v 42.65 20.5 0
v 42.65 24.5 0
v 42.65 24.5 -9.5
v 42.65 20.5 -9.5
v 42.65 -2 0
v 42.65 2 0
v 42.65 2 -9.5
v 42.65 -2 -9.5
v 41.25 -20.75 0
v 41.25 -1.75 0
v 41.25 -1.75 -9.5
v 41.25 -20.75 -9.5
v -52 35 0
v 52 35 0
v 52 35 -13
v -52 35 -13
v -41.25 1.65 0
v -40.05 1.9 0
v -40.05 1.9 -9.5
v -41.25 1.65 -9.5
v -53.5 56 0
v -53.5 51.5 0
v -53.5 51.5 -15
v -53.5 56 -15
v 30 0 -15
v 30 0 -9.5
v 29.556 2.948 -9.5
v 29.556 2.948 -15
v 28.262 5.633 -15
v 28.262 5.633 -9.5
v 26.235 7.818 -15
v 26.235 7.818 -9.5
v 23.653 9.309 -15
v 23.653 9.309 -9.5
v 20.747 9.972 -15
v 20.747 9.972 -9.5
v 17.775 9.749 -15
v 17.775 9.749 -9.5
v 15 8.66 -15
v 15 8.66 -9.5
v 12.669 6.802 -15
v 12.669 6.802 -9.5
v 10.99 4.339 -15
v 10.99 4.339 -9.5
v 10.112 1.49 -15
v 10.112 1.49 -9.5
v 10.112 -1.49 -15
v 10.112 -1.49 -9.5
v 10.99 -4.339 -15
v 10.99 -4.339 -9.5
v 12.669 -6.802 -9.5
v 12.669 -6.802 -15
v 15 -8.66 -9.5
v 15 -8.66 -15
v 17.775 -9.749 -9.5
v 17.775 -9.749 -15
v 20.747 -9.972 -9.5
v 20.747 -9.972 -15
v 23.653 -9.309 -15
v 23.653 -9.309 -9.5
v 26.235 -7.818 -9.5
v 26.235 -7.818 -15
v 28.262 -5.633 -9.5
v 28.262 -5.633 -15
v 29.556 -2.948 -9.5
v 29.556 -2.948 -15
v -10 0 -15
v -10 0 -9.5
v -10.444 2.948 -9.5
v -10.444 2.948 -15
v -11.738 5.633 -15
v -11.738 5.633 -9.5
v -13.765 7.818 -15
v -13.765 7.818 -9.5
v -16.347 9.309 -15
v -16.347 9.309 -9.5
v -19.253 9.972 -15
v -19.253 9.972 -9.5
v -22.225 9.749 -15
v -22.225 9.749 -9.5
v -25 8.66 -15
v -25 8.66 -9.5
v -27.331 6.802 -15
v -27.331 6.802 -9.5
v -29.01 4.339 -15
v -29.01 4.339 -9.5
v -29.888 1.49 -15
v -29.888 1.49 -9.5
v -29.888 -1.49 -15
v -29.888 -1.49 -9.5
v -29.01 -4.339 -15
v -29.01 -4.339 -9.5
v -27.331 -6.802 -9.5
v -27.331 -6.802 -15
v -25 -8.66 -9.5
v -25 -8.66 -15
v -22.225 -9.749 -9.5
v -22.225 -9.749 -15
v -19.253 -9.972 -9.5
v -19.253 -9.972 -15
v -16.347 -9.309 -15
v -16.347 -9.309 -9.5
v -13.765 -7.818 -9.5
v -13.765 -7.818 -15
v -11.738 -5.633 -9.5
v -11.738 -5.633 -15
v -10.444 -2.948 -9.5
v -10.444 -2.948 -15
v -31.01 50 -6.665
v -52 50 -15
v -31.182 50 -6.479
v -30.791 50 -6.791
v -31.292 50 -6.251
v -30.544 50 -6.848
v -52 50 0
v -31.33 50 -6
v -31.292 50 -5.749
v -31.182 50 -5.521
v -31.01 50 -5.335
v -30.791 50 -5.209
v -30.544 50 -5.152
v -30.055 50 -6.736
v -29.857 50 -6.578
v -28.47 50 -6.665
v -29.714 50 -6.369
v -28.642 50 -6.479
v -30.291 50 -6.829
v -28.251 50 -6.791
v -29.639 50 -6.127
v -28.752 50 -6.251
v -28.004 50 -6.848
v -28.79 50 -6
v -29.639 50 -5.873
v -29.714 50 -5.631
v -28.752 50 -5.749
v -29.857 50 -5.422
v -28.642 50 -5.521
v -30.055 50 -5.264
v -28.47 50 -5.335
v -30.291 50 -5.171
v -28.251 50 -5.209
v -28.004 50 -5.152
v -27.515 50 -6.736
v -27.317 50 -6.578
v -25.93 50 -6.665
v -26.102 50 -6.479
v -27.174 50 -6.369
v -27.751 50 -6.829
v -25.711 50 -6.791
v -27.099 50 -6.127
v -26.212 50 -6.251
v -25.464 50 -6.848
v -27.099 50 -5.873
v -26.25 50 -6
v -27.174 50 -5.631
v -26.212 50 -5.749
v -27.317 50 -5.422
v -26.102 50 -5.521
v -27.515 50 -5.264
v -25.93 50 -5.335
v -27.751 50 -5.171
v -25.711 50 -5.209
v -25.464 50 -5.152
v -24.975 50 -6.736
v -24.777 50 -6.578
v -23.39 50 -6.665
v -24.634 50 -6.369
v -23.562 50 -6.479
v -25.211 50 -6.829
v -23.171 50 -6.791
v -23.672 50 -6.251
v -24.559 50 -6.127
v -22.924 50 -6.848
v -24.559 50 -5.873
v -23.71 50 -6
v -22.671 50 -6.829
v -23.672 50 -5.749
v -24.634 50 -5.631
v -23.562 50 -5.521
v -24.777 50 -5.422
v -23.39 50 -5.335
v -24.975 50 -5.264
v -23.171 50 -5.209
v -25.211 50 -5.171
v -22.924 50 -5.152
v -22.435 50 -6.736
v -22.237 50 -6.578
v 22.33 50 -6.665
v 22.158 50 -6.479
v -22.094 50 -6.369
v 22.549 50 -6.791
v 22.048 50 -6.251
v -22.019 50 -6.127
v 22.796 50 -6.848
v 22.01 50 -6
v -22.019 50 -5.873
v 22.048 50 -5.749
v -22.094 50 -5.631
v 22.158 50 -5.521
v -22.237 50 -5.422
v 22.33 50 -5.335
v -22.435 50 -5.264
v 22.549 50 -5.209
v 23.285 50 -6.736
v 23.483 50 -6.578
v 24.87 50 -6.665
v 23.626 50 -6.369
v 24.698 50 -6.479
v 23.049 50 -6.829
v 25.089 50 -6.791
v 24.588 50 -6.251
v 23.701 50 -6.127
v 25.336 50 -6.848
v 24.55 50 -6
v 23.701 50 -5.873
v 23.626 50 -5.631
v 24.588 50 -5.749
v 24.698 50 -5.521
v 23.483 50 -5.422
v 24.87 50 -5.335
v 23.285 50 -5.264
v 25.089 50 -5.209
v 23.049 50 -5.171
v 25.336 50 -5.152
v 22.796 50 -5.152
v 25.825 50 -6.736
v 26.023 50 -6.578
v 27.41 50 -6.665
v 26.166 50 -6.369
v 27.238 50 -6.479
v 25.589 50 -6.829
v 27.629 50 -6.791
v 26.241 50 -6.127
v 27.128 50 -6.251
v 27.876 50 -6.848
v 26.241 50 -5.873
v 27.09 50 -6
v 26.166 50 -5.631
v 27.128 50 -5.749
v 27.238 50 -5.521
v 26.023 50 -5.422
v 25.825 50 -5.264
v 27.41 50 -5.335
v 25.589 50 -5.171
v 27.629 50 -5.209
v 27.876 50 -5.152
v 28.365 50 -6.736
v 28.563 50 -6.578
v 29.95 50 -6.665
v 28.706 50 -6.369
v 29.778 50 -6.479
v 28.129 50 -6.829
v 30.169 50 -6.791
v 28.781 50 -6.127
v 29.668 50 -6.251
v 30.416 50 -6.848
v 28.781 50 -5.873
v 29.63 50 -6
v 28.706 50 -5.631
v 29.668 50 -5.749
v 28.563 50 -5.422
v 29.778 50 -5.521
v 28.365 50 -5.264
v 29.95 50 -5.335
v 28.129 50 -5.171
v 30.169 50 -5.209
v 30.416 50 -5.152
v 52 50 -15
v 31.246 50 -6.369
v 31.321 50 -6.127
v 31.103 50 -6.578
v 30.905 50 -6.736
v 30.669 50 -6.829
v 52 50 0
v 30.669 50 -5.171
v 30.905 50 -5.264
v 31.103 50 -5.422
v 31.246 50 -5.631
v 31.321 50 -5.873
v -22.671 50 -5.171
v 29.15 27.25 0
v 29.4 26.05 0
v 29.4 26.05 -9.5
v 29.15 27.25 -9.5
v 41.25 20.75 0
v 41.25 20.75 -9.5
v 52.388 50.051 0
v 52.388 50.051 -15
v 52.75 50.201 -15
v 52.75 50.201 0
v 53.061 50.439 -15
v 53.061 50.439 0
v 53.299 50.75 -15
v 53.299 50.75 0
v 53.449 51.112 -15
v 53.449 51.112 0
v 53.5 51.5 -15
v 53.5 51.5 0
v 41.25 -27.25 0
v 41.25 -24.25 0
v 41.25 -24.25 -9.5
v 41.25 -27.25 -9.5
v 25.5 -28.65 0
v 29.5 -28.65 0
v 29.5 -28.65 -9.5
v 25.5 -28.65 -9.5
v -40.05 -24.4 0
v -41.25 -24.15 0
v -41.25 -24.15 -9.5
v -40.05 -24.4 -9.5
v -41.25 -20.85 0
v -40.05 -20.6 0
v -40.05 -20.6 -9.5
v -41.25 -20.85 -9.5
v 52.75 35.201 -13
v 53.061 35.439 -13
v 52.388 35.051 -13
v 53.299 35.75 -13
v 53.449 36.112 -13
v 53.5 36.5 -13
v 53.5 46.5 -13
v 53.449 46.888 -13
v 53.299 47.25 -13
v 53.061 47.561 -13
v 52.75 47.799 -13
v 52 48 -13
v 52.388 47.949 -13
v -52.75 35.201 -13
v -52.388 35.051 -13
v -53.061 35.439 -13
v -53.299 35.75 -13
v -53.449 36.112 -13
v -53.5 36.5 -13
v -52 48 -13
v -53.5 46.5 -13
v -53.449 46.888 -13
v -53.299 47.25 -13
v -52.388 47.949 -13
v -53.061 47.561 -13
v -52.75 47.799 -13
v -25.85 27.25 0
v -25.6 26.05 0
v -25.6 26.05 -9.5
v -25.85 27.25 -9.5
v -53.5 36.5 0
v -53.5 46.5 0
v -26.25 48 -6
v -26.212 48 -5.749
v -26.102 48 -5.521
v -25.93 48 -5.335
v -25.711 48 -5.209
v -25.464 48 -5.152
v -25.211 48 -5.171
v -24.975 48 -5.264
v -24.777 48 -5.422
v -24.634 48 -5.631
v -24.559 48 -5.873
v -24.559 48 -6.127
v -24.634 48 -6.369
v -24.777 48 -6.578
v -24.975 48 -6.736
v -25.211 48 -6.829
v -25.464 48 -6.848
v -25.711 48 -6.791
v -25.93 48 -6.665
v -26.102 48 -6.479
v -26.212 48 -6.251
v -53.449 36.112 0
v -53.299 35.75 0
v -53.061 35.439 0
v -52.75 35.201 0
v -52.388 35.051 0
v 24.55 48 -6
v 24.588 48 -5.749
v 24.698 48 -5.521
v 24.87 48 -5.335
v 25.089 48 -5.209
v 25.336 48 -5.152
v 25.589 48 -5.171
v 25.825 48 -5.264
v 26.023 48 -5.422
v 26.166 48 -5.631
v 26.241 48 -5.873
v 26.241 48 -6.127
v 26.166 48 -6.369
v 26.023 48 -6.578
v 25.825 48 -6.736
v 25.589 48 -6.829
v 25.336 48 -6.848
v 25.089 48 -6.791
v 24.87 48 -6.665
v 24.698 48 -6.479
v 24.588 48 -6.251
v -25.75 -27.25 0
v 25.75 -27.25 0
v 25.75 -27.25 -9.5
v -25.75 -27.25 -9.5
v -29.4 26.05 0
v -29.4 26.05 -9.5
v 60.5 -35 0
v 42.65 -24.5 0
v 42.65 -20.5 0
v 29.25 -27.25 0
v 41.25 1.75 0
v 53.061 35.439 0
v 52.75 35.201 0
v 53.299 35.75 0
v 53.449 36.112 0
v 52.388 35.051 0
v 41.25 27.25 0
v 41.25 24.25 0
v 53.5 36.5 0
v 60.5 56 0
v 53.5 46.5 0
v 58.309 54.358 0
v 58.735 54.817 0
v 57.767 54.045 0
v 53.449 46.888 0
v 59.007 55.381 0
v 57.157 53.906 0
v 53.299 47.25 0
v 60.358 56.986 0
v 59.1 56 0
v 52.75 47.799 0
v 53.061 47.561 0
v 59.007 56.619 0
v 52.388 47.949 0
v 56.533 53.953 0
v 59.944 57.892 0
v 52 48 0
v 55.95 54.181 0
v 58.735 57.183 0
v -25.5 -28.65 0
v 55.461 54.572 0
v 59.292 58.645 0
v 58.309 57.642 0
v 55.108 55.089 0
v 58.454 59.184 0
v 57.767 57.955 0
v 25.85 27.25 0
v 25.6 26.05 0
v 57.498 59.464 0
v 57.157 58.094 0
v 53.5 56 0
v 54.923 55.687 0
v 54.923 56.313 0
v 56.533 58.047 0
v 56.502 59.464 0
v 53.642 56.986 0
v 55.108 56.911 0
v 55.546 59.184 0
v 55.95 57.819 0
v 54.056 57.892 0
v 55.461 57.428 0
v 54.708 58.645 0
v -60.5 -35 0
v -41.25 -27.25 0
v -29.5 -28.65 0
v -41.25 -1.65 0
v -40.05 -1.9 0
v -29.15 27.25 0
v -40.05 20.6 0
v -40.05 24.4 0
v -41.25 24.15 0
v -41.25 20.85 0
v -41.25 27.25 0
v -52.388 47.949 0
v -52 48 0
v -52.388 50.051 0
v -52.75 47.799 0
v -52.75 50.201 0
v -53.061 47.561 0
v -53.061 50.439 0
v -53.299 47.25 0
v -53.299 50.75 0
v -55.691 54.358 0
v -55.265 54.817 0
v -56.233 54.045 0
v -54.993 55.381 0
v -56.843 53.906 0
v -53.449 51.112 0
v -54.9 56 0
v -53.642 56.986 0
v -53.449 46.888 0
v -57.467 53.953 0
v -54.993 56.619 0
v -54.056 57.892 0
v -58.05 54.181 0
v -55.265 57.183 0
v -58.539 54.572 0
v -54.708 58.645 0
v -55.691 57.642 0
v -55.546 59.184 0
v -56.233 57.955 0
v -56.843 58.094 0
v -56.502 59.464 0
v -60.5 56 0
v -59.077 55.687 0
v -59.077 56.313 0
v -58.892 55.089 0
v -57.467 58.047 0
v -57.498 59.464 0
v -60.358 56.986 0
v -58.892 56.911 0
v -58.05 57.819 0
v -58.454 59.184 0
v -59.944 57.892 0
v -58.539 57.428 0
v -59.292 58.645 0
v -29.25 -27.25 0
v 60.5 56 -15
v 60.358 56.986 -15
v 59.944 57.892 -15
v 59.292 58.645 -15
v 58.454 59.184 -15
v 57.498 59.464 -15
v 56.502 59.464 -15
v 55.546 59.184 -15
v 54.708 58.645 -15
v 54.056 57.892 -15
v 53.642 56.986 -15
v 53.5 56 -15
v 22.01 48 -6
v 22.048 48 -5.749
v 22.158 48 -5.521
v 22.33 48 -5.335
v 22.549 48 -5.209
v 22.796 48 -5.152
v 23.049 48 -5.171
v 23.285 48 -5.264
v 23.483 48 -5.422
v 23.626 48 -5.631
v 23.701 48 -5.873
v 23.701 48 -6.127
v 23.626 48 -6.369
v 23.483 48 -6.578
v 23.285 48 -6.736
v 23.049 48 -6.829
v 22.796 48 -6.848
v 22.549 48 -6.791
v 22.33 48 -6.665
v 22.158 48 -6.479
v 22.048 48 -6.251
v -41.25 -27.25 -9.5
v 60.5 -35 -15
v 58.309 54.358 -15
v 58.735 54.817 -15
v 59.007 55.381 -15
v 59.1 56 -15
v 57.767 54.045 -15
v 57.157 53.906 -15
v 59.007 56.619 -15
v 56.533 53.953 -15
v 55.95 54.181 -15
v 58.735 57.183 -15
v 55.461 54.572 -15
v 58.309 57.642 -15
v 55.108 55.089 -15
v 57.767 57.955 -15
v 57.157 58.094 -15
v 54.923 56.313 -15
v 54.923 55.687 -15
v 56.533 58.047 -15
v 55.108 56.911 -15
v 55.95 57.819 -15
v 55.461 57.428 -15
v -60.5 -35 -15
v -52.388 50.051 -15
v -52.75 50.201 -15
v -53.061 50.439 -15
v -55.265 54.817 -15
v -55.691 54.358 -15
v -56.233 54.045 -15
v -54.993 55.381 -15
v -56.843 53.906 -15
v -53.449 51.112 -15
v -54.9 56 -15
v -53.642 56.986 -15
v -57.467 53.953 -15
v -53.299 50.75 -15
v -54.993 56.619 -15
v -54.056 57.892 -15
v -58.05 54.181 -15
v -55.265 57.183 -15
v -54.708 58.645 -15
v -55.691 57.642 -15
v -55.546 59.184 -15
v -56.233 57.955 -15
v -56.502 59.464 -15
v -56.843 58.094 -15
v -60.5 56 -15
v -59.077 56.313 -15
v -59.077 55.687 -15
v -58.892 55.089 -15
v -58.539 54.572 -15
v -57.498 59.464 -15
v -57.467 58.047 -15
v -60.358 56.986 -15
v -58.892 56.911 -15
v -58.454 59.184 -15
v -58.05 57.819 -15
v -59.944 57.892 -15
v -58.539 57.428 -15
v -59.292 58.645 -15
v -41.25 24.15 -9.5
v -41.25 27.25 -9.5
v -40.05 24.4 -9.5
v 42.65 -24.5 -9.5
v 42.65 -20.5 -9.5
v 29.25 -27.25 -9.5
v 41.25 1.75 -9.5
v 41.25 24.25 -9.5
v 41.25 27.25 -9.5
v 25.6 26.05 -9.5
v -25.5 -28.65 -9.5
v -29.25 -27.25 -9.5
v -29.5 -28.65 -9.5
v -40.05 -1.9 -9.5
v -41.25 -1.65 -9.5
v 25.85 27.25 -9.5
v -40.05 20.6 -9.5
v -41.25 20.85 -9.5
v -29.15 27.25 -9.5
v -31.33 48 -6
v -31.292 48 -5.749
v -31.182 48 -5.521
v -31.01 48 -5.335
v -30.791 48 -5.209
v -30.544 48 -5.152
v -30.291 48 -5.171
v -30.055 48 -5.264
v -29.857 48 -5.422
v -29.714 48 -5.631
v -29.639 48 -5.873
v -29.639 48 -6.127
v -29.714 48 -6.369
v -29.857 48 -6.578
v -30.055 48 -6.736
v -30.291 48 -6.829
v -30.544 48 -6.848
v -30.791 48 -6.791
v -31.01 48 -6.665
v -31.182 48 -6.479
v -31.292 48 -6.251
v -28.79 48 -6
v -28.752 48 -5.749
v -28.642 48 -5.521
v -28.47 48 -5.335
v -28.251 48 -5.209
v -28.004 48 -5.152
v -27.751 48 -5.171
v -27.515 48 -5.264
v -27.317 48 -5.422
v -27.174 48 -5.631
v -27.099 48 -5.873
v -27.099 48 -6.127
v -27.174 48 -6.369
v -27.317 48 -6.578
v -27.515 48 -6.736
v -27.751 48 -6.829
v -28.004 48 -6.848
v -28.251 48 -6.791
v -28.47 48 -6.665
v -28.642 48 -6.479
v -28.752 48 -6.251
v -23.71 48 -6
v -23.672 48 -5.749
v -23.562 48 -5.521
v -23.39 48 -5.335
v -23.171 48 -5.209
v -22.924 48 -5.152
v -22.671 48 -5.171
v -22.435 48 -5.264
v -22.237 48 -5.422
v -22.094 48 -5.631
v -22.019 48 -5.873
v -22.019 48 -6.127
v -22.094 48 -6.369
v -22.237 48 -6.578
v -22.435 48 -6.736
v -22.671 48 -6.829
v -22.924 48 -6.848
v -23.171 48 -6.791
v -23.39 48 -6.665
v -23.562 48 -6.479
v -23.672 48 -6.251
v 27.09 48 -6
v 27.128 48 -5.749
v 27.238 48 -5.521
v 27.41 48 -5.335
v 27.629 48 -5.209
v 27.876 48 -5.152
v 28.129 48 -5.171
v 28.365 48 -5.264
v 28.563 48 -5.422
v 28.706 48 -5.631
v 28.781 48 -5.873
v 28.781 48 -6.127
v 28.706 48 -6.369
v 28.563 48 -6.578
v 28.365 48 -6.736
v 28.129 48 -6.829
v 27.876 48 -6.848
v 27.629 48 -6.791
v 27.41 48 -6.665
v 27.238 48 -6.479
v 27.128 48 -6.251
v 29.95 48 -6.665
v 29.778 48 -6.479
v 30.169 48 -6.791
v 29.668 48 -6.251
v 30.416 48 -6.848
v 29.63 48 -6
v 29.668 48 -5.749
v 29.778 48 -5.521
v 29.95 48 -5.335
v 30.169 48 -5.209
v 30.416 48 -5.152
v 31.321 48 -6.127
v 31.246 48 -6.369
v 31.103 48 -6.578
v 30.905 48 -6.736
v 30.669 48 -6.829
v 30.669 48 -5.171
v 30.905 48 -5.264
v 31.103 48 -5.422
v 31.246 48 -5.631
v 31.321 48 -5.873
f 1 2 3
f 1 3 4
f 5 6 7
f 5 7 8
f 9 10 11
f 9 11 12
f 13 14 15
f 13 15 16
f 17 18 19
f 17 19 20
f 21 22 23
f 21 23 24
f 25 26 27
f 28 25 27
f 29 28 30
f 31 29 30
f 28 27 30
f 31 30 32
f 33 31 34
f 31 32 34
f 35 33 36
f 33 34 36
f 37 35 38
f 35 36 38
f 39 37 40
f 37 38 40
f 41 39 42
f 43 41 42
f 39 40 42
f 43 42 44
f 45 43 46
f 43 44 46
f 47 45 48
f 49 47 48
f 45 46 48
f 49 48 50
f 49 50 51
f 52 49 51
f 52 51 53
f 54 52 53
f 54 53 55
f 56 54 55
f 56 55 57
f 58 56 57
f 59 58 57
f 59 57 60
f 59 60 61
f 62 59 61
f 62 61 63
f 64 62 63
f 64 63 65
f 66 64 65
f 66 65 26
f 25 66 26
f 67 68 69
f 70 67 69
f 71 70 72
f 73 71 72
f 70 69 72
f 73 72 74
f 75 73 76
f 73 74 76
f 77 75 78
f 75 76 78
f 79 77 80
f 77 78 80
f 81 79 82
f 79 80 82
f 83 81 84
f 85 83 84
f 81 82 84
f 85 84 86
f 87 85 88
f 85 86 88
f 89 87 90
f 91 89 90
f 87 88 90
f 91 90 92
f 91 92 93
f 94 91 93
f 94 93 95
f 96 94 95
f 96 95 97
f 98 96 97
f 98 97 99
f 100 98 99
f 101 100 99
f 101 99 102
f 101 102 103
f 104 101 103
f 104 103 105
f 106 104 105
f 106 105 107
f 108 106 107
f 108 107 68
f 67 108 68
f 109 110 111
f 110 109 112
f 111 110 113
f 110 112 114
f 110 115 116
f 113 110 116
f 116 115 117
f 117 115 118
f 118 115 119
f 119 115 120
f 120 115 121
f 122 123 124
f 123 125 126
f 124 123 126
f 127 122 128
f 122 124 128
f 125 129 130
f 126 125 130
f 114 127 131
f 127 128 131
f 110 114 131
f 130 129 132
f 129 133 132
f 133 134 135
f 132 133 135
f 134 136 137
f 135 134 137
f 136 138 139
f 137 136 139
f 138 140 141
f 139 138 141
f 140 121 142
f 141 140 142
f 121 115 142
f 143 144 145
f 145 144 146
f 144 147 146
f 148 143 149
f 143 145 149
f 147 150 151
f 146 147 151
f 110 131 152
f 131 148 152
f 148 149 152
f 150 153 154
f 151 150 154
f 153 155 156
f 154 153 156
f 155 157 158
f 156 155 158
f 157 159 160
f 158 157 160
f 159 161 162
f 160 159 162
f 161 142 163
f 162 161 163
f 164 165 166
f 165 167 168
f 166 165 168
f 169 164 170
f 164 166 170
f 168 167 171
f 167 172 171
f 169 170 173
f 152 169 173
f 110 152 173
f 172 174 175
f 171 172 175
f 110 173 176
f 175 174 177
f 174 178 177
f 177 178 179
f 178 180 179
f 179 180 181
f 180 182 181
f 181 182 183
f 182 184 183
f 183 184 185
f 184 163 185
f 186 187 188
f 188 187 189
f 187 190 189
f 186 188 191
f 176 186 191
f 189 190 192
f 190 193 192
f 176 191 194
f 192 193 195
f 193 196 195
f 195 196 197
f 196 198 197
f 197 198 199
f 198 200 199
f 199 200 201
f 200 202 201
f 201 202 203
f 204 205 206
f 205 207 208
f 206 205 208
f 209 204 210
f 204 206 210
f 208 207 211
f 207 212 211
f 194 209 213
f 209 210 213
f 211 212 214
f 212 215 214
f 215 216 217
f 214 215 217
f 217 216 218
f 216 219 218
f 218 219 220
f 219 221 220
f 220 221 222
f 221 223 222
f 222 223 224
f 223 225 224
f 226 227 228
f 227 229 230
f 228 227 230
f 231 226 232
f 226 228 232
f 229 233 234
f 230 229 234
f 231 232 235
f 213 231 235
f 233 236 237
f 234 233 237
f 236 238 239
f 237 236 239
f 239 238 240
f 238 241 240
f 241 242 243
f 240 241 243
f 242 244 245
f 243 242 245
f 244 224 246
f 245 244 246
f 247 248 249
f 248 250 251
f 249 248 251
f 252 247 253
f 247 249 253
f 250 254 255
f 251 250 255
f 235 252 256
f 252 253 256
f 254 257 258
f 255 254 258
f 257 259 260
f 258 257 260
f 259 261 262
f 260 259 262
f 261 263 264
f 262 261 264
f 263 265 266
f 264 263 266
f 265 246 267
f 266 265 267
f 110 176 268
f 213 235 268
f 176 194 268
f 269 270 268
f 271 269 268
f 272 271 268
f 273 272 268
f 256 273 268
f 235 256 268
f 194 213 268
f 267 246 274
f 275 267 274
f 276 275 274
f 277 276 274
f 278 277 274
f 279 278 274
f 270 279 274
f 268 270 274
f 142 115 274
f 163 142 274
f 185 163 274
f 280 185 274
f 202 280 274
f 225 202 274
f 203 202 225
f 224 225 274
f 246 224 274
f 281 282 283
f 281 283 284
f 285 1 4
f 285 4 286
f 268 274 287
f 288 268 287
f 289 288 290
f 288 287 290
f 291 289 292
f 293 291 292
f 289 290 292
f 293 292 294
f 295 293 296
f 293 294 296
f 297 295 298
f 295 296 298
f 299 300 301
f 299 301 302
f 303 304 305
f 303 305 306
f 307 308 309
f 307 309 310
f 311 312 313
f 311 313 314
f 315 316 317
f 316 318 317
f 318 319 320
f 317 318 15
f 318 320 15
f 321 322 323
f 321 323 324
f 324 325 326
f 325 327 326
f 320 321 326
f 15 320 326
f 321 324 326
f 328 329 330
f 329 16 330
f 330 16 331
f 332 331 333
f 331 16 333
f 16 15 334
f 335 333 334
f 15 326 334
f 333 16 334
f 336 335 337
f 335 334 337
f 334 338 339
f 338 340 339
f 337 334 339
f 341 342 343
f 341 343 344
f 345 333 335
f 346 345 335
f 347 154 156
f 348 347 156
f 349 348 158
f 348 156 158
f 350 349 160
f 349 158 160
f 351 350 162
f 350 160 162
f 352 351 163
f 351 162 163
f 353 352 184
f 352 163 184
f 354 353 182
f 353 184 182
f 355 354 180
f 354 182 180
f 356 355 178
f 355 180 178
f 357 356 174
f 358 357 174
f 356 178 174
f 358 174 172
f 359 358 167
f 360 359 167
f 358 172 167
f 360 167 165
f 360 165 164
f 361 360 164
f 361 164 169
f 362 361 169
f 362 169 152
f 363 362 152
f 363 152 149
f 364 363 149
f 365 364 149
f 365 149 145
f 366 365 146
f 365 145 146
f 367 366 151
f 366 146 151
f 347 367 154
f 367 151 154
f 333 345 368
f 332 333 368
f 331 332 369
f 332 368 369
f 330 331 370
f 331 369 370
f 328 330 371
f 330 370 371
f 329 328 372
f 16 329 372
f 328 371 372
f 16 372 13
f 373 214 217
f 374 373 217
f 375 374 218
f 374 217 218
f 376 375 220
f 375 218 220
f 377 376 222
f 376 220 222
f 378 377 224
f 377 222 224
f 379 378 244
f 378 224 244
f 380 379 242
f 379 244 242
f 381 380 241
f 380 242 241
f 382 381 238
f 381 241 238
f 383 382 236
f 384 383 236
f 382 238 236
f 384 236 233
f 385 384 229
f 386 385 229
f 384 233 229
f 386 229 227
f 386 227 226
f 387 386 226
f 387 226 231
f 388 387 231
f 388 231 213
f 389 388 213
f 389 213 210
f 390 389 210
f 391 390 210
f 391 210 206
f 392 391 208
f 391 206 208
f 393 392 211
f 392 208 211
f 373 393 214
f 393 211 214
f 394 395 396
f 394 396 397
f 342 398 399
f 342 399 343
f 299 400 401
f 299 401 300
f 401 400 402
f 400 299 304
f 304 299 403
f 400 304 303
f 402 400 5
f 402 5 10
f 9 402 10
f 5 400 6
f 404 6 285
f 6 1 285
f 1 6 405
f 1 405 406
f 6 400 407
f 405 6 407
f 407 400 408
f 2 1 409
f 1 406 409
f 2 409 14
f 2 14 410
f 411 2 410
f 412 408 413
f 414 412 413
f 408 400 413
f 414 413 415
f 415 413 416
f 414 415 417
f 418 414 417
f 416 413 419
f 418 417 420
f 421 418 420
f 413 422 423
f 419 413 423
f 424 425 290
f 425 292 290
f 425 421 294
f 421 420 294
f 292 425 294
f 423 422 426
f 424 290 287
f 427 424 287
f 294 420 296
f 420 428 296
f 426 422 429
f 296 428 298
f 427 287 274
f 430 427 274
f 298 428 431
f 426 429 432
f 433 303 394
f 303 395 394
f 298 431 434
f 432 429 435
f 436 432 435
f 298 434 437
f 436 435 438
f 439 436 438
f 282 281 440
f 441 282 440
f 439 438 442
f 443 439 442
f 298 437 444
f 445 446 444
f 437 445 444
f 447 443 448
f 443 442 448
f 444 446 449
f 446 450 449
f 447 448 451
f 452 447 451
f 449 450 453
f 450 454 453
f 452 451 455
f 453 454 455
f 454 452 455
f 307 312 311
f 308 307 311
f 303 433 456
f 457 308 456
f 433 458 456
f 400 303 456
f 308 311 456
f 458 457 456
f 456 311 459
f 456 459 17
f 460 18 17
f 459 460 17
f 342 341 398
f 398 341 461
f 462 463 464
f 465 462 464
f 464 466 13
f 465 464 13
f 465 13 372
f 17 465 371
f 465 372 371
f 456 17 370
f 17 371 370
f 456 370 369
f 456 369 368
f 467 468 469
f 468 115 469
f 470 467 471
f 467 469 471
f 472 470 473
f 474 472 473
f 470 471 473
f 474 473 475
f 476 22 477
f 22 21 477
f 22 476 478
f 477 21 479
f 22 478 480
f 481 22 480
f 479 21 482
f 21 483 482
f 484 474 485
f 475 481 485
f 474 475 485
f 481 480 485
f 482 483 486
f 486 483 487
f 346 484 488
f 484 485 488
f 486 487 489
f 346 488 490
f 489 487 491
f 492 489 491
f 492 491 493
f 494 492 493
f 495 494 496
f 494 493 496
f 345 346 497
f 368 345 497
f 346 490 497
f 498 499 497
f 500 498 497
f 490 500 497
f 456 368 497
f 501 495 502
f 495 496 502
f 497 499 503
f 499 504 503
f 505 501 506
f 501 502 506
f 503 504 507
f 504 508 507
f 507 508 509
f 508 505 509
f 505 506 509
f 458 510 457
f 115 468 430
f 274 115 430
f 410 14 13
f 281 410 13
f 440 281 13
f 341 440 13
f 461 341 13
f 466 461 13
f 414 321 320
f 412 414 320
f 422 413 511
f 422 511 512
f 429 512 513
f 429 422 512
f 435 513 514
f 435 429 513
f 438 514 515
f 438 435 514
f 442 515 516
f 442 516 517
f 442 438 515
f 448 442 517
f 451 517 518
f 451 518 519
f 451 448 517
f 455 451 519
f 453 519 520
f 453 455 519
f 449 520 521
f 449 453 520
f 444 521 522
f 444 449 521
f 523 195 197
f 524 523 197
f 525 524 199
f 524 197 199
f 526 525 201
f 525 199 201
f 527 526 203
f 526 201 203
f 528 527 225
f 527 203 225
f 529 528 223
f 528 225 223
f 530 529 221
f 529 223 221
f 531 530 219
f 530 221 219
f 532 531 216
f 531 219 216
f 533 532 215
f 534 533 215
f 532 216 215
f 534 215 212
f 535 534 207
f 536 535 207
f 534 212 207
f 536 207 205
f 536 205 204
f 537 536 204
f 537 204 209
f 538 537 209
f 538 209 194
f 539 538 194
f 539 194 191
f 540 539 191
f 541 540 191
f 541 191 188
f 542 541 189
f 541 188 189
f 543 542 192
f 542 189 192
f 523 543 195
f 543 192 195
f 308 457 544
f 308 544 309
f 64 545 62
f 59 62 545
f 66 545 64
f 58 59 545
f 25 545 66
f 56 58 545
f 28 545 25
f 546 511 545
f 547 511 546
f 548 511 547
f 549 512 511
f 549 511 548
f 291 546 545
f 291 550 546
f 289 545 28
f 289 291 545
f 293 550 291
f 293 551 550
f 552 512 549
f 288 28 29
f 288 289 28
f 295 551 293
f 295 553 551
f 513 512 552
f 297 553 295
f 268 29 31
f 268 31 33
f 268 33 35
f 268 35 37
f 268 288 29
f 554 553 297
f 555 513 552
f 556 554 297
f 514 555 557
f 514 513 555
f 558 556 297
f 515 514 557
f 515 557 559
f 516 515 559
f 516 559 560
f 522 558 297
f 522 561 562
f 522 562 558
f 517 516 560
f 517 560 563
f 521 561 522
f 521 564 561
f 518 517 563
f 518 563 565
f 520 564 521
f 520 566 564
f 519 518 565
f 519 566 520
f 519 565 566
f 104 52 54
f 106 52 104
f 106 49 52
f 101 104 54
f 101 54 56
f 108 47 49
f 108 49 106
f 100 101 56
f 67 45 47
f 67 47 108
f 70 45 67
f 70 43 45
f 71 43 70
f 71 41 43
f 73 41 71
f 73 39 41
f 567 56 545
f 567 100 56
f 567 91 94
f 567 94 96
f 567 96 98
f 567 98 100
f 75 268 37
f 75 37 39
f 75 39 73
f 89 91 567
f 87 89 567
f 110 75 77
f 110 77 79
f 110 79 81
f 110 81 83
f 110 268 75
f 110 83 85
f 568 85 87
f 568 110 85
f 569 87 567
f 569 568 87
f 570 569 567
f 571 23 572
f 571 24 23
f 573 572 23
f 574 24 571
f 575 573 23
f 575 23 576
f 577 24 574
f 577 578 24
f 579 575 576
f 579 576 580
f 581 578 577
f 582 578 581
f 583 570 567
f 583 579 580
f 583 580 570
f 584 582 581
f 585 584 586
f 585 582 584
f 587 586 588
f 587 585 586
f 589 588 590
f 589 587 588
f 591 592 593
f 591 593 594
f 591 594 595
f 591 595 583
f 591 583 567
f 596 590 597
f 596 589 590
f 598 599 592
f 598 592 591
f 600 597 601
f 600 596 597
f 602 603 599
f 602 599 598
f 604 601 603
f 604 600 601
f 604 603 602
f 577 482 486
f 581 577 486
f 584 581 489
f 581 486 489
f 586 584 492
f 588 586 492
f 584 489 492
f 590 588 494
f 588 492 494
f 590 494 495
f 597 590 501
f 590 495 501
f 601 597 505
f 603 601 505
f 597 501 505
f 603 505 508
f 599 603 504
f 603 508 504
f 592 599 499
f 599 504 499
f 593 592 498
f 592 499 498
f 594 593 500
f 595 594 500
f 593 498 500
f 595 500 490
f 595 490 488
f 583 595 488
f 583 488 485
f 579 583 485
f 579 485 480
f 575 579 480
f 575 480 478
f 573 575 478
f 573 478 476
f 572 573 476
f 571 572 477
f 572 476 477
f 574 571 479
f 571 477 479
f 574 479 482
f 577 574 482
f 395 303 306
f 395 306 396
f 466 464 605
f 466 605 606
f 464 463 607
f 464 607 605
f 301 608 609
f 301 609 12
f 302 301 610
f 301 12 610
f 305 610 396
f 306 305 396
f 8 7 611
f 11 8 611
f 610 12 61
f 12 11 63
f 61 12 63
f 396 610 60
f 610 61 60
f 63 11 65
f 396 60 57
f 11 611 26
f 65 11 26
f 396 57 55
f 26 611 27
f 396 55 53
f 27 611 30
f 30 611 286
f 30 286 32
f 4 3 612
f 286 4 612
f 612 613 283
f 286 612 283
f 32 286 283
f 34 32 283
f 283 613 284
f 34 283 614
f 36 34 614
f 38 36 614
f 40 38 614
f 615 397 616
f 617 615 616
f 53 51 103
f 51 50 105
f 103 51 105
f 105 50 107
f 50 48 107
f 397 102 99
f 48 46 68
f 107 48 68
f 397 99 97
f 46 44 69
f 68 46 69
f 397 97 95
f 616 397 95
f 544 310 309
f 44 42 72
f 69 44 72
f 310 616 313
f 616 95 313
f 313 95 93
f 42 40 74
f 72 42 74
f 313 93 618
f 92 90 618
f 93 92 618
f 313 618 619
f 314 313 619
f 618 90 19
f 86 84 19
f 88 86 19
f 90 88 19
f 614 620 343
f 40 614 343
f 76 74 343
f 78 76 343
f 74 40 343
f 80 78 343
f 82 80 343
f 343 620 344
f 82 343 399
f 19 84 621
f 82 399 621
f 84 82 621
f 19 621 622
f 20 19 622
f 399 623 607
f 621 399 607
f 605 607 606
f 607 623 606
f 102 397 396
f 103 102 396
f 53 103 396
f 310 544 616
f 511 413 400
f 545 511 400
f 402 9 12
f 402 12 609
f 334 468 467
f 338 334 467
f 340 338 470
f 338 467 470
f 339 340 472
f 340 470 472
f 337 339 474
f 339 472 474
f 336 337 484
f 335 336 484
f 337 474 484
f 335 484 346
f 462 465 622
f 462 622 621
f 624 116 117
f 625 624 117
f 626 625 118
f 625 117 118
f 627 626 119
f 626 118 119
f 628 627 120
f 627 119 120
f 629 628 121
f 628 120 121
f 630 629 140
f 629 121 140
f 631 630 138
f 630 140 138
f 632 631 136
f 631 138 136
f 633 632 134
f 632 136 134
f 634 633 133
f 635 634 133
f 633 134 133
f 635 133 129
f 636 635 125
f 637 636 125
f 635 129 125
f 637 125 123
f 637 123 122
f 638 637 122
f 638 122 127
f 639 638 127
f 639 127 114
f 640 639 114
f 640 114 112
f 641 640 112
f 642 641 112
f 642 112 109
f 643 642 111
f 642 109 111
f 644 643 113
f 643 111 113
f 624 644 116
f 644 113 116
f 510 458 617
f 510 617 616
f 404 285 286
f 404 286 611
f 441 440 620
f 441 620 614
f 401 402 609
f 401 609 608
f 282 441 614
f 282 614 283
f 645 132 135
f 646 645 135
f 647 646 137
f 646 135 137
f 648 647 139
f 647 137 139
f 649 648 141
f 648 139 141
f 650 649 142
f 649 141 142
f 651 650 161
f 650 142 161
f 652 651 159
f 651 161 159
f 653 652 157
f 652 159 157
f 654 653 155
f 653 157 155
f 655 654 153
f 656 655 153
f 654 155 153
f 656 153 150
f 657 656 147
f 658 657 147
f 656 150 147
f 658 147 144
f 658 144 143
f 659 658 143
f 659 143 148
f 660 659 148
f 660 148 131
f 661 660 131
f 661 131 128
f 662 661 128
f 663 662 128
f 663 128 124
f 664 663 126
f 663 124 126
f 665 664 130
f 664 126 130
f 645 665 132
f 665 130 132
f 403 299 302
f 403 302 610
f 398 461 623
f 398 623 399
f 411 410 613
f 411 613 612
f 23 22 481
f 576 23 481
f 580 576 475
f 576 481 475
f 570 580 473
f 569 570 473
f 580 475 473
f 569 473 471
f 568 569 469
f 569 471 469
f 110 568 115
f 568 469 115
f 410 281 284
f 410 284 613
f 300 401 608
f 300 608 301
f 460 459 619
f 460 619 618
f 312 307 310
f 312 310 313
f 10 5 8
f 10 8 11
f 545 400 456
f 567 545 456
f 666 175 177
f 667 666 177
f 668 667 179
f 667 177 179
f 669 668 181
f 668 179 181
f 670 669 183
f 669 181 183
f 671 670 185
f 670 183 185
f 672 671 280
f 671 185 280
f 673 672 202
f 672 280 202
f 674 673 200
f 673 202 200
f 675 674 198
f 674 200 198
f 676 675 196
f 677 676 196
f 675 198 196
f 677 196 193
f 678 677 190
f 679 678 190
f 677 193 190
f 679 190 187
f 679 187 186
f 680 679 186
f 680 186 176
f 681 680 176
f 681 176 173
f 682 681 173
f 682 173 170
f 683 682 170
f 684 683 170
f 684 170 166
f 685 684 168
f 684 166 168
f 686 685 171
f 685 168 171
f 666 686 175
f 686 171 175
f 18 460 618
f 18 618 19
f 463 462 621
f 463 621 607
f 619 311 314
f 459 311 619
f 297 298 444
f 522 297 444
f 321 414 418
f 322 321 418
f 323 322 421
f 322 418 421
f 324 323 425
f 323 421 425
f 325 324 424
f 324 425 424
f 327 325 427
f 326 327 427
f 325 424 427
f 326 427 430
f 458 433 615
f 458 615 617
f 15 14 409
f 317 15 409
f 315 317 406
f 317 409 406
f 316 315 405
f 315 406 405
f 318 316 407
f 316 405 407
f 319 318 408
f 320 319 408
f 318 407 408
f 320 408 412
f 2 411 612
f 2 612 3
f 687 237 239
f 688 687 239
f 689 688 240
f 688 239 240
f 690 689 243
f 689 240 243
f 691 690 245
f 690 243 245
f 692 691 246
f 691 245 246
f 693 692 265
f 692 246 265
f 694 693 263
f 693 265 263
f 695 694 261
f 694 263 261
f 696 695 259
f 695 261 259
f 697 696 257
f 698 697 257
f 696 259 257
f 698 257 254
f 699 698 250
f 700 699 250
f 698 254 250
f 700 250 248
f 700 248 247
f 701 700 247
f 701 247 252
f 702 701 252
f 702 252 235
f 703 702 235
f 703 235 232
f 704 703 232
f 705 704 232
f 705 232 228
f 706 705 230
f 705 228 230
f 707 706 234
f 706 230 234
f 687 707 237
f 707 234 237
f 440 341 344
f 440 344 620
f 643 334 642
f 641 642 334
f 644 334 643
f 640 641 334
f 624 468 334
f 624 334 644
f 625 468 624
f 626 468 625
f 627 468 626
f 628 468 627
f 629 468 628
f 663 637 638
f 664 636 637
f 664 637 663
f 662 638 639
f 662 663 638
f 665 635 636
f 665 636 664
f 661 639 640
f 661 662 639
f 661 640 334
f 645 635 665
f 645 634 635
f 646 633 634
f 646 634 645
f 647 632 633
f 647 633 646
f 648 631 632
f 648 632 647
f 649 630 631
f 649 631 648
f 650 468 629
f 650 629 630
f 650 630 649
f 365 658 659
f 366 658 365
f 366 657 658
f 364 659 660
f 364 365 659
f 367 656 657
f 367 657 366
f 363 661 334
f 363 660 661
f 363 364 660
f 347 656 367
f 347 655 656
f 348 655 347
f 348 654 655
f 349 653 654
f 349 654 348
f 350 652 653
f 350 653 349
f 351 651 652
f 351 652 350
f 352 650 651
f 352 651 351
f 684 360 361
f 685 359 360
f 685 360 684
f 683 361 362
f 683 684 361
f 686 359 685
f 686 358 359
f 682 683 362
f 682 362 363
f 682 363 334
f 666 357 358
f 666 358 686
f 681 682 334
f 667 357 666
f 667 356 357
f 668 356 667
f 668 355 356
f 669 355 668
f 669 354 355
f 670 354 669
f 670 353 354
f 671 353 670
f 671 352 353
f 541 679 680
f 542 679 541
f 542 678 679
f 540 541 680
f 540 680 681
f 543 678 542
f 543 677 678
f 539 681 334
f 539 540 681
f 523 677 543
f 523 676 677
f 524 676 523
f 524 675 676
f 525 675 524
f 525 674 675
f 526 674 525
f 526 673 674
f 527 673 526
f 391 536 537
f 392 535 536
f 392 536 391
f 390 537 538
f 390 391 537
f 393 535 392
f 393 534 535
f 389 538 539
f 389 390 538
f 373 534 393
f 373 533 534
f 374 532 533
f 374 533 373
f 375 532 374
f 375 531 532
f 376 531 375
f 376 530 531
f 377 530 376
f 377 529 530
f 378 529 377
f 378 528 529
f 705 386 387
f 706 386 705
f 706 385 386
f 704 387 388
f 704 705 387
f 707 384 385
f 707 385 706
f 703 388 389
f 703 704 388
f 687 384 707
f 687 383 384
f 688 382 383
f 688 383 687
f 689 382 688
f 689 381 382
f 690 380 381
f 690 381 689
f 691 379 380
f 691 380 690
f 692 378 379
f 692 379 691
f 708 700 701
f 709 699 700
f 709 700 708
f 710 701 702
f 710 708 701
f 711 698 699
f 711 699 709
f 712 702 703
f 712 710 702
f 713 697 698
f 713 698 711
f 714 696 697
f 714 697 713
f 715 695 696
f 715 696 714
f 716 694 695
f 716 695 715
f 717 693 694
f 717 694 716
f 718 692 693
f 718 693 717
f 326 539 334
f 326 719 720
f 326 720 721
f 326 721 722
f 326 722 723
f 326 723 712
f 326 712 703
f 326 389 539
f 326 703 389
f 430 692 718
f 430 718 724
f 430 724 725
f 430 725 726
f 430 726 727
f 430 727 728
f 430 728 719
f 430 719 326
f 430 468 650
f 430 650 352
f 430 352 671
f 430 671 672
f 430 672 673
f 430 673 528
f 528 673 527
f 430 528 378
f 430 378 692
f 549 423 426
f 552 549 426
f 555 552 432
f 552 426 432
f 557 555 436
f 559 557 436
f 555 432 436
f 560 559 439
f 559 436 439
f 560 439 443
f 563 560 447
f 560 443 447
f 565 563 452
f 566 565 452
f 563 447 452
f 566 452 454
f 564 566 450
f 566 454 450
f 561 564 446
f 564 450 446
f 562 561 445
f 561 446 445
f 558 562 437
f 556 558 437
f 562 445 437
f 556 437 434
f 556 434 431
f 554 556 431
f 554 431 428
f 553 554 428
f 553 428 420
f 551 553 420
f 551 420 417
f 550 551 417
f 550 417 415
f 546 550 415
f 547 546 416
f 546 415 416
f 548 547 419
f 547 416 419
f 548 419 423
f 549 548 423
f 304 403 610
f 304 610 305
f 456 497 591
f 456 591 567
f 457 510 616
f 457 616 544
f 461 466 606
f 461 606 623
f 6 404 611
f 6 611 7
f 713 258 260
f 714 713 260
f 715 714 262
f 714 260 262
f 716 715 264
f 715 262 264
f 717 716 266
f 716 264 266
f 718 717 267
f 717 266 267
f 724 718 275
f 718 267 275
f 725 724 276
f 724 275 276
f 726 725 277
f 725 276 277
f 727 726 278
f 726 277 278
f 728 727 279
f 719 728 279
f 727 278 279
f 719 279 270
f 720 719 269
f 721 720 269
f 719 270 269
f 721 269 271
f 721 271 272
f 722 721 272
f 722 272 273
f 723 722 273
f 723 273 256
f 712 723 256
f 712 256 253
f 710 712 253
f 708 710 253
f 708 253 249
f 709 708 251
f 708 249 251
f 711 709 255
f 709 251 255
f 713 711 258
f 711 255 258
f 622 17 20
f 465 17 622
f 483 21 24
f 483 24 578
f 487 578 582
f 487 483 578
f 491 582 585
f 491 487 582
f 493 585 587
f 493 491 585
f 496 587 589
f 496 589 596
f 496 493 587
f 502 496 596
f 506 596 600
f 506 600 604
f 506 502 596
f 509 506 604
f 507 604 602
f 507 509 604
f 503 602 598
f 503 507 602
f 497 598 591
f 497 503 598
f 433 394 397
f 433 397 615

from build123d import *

# Parameters (mm, degrees)
PAD001_DEPTH    = 9.5
SKETCH_R        = 2.1
PAD_DEPTH       = 15
POCKET_DEPTH    = 13
SKETCH003_R     = 10
POCKET001_DEPTH = 5.501
SKETCH004_R     = 0.85
POCKET002_DEPTH = 2


with BuildPart() as feature_breadboard:
    # Sketch002 → Pad001 (new body)
    with BuildSketch(Plane.XY):
        Polygon((-41.25, 27.25), (-29.15, 27.25), (-29.4, 26.05), (-25.6, 26.05), (-25.85, 27.25), (25.85, 27.25), (25.6, 26.05), (29.4, 26.05), (29.15, 27.25), (41.25, 27.25), (41.25, 24.25), (42.65, 24.5), (42.65, 20.5), (41.25, 20.75), (41.25, 1.75), (42.65, 2), (42.65, -2), (41.25, -1.75), (41.25, -20.75), (42.65, -20.5), (42.65, -24.5), (41.25, -24.25), (41.25, -27.25), (29.25, -27.25), (29.5, -28.65), (25.5, -28.65), (25.75, -27.25), (-25.75, -27.25), (-25.5, -28.65), (-29.5, -28.65), (-29.25, -27.25), (-41.25, -27.25), (-41.25, -24.15), (-40.05, -24.4), (-40.05, -20.6), (-41.25, -20.85), (-41.25, -1.65), (-40.05, -1.9), (-40.05, 1.9), (-41.25, 1.65), (-41.25, 20.85), (-40.05, 20.6), (-40.05, 24.4), (-41.25, 24.15), align=None)
    extrude(amount=-PAD001_DEPTH)


with BuildPart() as body:
    # Sketch → Pad (new body)
    with BuildSketch(Plane.XY):
        with BuildLine():
            Line((-52, 50), (52, 50))
            ThreePointArc((52, 50), (53.06066, 50.43934), (53.5, 51.5))
            Line((53.5, 51.5), (53.5, 56))
            ThreePointArc((60.5, 56), (57, 59.5), (53.5, 56))
            Line((60.5, 56), (60.5, -35))
            Line((60.5, -35), (-60.5, -35))
            Line((-60.5, 56), (-60.5, -35))
            ThreePointArc((-53.5, 56), (-57, 59.5), (-60.5, 56))
            Line((-53.5, 51.5), (-53.5, 56))
            ThreePointArc((-53.5, 51.5), (-53.06066, 50.43934), (-52, 50))
        make_face()
        with Locations((-57, 56)):
            Circle(SKETCH_R, mode=Mode.SUBTRACT)
        with Locations((57, 56)):
            Circle(SKETCH_R, mode=Mode.SUBTRACT)
    extrude(amount=-PAD_DEPTH)

    # Sketch001 (on Face13 of Pad) → Pocket (cut)
    with BuildSketch(Plane.XY):
        with BuildLine():
            Line((-52, 48), (52, 48))
            ThreePointArc((53.5, 46.5), (53.06066, 47.56066), (52, 48))
            Line((53.5, 46.5), (53.5, 36.5))
            ThreePointArc((52, 35), (53.06066, 35.43934), (53.5, 36.5))
            Line((52, 35), (-52, 35))
            ThreePointArc((-53.5, 36.5), (-53.06066, 35.43934), (-52, 35))
            Line((-53.5, 36.5), (-53.5, 46.5))
            ThreePointArc((-52, 48), (-53.06066, 47.56066), (-53.5, 46.5))
        make_face()
    extrude(amount=-POCKET_DEPTH, mode=Mode.SUBTRACT)

    # Boolean: cut feature_breadboard
    add(feature_breadboard.part, mode=Mode.SUBTRACT)

    # Sketch003 (on Face68 of Boolean) → Pocket001 (cut, through all)
    with BuildSketch(Plane.XY.offset(-9.5)):
        with Locations((-20, 0)):
            Circle(SKETCH003_R)
        with Locations((20, 0)):
            Circle(SKETCH003_R)
    extrude(amount=-POCKET001_DEPTH, mode=Mode.SUBTRACT)

    # Sketch004 (on Face3 of Pocket001) → Pocket002 (cut)
    with BuildSketch(Plane(origin=(0, 50, 0), x_dir=(-1, 0, 0), z_dir=(0, 1, 0))):
        with Locations((-30.48, -6)):
            Circle(SKETCH004_R)
        with Locations((-27.94, -6)):
            Circle(SKETCH004_R)
        with Locations((-25.4, -6)):
            Circle(SKETCH004_R)
        with Locations((-22.86, -6)):
            Circle(SKETCH004_R)
        with Locations((22.86, -6)):
            Circle(SKETCH004_R)
        with Locations((25.4, -6)):
            Circle(SKETCH004_R)
        with Locations((27.94, -6)):
            Circle(SKETCH004_R)
        with Locations((30.48, -6)):
            Circle(SKETCH004_R)
    extrude(amount=-POCKET002_DEPTH, mode=Mode.SUBTRACT)


solid = body.part
